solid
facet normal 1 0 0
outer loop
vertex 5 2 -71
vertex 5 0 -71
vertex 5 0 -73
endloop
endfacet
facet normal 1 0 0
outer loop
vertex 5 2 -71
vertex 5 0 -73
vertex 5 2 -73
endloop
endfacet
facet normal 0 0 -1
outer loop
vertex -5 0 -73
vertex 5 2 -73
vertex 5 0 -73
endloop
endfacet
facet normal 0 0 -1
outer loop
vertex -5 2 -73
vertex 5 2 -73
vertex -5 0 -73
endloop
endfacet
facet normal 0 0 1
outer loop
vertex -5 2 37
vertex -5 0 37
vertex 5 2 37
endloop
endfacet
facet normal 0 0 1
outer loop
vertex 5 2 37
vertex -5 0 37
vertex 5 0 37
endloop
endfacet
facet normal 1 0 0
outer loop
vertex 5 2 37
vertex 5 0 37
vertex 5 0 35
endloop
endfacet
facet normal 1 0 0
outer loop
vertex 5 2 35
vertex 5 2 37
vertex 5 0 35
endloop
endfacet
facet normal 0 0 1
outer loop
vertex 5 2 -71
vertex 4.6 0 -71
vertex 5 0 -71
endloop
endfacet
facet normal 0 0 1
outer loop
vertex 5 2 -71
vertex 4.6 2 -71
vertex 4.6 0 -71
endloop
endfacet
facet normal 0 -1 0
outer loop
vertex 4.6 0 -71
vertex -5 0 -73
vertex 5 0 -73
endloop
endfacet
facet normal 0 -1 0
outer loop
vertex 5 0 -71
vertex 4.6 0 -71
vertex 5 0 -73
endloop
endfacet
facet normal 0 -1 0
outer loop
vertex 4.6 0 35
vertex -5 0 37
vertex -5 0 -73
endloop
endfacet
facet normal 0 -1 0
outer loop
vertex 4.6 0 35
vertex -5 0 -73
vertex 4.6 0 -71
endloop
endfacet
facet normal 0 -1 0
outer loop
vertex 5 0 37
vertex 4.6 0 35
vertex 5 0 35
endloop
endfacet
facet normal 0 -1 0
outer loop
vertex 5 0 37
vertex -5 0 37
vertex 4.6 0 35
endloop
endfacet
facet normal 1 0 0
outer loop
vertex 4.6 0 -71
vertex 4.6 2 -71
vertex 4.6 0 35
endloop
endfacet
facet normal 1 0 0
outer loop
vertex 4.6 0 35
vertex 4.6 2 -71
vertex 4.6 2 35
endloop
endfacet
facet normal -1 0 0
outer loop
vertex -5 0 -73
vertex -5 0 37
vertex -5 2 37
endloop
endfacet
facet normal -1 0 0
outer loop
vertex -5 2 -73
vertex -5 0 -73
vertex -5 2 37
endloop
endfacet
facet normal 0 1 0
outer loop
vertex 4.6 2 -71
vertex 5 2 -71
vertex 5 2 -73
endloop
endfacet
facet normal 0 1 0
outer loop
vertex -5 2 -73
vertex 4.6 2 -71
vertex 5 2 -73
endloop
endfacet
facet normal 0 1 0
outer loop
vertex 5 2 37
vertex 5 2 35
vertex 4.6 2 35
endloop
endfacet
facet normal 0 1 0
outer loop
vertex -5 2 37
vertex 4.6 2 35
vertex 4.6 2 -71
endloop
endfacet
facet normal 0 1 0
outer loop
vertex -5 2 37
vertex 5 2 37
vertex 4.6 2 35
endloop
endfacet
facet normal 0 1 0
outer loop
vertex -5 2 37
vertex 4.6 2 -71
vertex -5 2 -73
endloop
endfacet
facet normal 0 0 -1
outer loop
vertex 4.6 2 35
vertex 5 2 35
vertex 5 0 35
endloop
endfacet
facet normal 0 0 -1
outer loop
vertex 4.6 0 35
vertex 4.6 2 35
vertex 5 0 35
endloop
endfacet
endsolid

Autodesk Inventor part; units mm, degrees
ref_plane "YZ Plane" through (0, 0, 0) normal (1, 0, 0) x (0, 1, 0)
ref_plane "XZ Plane" through (0, 0, 0) normal (0, 1, 0) x (-1, 0, 0)
ref_plane "XY Plane" through (0, 0, 0) normal (0, 0, 1) x (1, 0, 0)
sketch "Sketch1" plane through (0, 0, 0) normal (0, 1, 0) x (-1, 0, 0)
  line L0 (5, 37) -> (-5, 37)
  line L1 (-5, 37) -> (-5, -37)
  line L2 (-5, -37) -> (5, -37)
  line L3 (5, -37) -> (5, 37)
  point P0 (0, 0)
  dimension "d0" = 10
  dimension "d1" = 74
  dimension "d2" = 5
  dimension "d3" = 37
extrude "Extrusion1" add sketch "Sketch1" along normal blind 2
sketch "Sketch2" plane through (5, 0, 37) normal (1, 0, 0) x (0, 0, -1)
  line L0 (74, 2) -> (0, 2) projected
  line L1 (74, 0) -> (0, 0) projected
  line L2 (0, 2) -> (2, 2)
  line L3 (2, 2) -> (2, 0)
  line L4 (2, 0) -> (0, 0)
  line L5 (0, 0) -> (0, 2)
  line L6 (2, 0) -> (74, 0)
  line L7 (74, 0) -> (74, 2)
  line L8 (74, 2) -> (2, 2)
  line L9 (2, 2) -> (2, 0)
  line L10 (74, 0) -> (72, 0)
  line L11 (72, 0) -> (72, 2)
  line L12 (72, 2) -> (74, 2)
  line L13 (74, 2) -> (74, 0)
  point P0 (37, 0)
  point P1 (2, 2)
  dimension "d6" = 72
extrude "Extrusion2" cut sketch "Sketch2" against normal blind 0.3 contours L11 L1 L3 L0
sketch "Sketch3" plane through (5, 0, -37) normal (0, 0, -1) x (-1, 0, 0)
  line L0 (10, 0) -> (10, 2) projected
  line L1 (0, 0) -> (0, 2) projected
  line L2 (10, 0) -> (0, 0)
  line L3 (0, 0) -> (0, 2)
  line L4 (0, 2) -> (10, 2)
  line L5 (10, 2) -> (10, 0)
  point P0 (5, 0)
extrude "Extrusion3" add sketch "Sketch3" along normal blind 36
sketch "Sketch4" plane through (0, 2, 0) normal (0, 1, 0) x (1, 0, 0)
  line L0 (-5, 73) -> (5, 73) projected
  line L1 (4.7, -35) -> (4.7, 35) projected
  line L2 (5, 73) -> (4.7, 73)
  line L3 (4.7, 73) -> (4.7, 35)
  line L4 (4.7, 35) -> (5, 35)
  line L5 (5, 35) -> (5, 73)
  line L6 (5, 35) -> (5, 73) projected
  line L7 (5, 73) -> (4.7, 73)
  line L8 (4.7, 73) -> (4.7, 71)
  line L9 (4.7, 71) -> (5, 71)
  line L10 (5, 71) -> (5, 73)
  line L11 (4.7, 71) -> (4.6, 71)
  line L12 (4.6, 71) -> (4.6, -35)
  line L13 (4.6, -35) -> (4.7, -35)
  line L14 (4.7, -35) -> (4.7, 71)
  point P0 (0, 0)
  dimension "d11" = 0.1
extrude "Extrusion4" cut sketch "Sketch4" against normal blind 18.25 contours L9 L5 L4 L3 | L3 L1 L13 L12 L11
sketch "Sketch5" plane through (0, 2, 0) normal (0, 1, 0) x (1, 0, 0)
  point P0 (0, 0)
equation "\"d2\" = 0.5 * d0"
equation "\"d3\" = 0.5 * d1"
equation "\"BendRadius\" = Thickness"
equation "\"BendReliefWidth\" = Thickness"
equation "\"BendReliefDepth\" = 0.5 * Thickness"
equation "\"CornerReliefSize\" = 4 * Thickness"
equation "\"MinimumRemnant\" = 2 * Thickness"
equation "\"TransitionRadius\" = BendRadius"
equation "\"JacobiRadiusSize\" = BendRadius"
equation "\"GapSize\" = Thickness"
equation "\"Thickness\" = 0.5"
properties part number "modelGateCover"
